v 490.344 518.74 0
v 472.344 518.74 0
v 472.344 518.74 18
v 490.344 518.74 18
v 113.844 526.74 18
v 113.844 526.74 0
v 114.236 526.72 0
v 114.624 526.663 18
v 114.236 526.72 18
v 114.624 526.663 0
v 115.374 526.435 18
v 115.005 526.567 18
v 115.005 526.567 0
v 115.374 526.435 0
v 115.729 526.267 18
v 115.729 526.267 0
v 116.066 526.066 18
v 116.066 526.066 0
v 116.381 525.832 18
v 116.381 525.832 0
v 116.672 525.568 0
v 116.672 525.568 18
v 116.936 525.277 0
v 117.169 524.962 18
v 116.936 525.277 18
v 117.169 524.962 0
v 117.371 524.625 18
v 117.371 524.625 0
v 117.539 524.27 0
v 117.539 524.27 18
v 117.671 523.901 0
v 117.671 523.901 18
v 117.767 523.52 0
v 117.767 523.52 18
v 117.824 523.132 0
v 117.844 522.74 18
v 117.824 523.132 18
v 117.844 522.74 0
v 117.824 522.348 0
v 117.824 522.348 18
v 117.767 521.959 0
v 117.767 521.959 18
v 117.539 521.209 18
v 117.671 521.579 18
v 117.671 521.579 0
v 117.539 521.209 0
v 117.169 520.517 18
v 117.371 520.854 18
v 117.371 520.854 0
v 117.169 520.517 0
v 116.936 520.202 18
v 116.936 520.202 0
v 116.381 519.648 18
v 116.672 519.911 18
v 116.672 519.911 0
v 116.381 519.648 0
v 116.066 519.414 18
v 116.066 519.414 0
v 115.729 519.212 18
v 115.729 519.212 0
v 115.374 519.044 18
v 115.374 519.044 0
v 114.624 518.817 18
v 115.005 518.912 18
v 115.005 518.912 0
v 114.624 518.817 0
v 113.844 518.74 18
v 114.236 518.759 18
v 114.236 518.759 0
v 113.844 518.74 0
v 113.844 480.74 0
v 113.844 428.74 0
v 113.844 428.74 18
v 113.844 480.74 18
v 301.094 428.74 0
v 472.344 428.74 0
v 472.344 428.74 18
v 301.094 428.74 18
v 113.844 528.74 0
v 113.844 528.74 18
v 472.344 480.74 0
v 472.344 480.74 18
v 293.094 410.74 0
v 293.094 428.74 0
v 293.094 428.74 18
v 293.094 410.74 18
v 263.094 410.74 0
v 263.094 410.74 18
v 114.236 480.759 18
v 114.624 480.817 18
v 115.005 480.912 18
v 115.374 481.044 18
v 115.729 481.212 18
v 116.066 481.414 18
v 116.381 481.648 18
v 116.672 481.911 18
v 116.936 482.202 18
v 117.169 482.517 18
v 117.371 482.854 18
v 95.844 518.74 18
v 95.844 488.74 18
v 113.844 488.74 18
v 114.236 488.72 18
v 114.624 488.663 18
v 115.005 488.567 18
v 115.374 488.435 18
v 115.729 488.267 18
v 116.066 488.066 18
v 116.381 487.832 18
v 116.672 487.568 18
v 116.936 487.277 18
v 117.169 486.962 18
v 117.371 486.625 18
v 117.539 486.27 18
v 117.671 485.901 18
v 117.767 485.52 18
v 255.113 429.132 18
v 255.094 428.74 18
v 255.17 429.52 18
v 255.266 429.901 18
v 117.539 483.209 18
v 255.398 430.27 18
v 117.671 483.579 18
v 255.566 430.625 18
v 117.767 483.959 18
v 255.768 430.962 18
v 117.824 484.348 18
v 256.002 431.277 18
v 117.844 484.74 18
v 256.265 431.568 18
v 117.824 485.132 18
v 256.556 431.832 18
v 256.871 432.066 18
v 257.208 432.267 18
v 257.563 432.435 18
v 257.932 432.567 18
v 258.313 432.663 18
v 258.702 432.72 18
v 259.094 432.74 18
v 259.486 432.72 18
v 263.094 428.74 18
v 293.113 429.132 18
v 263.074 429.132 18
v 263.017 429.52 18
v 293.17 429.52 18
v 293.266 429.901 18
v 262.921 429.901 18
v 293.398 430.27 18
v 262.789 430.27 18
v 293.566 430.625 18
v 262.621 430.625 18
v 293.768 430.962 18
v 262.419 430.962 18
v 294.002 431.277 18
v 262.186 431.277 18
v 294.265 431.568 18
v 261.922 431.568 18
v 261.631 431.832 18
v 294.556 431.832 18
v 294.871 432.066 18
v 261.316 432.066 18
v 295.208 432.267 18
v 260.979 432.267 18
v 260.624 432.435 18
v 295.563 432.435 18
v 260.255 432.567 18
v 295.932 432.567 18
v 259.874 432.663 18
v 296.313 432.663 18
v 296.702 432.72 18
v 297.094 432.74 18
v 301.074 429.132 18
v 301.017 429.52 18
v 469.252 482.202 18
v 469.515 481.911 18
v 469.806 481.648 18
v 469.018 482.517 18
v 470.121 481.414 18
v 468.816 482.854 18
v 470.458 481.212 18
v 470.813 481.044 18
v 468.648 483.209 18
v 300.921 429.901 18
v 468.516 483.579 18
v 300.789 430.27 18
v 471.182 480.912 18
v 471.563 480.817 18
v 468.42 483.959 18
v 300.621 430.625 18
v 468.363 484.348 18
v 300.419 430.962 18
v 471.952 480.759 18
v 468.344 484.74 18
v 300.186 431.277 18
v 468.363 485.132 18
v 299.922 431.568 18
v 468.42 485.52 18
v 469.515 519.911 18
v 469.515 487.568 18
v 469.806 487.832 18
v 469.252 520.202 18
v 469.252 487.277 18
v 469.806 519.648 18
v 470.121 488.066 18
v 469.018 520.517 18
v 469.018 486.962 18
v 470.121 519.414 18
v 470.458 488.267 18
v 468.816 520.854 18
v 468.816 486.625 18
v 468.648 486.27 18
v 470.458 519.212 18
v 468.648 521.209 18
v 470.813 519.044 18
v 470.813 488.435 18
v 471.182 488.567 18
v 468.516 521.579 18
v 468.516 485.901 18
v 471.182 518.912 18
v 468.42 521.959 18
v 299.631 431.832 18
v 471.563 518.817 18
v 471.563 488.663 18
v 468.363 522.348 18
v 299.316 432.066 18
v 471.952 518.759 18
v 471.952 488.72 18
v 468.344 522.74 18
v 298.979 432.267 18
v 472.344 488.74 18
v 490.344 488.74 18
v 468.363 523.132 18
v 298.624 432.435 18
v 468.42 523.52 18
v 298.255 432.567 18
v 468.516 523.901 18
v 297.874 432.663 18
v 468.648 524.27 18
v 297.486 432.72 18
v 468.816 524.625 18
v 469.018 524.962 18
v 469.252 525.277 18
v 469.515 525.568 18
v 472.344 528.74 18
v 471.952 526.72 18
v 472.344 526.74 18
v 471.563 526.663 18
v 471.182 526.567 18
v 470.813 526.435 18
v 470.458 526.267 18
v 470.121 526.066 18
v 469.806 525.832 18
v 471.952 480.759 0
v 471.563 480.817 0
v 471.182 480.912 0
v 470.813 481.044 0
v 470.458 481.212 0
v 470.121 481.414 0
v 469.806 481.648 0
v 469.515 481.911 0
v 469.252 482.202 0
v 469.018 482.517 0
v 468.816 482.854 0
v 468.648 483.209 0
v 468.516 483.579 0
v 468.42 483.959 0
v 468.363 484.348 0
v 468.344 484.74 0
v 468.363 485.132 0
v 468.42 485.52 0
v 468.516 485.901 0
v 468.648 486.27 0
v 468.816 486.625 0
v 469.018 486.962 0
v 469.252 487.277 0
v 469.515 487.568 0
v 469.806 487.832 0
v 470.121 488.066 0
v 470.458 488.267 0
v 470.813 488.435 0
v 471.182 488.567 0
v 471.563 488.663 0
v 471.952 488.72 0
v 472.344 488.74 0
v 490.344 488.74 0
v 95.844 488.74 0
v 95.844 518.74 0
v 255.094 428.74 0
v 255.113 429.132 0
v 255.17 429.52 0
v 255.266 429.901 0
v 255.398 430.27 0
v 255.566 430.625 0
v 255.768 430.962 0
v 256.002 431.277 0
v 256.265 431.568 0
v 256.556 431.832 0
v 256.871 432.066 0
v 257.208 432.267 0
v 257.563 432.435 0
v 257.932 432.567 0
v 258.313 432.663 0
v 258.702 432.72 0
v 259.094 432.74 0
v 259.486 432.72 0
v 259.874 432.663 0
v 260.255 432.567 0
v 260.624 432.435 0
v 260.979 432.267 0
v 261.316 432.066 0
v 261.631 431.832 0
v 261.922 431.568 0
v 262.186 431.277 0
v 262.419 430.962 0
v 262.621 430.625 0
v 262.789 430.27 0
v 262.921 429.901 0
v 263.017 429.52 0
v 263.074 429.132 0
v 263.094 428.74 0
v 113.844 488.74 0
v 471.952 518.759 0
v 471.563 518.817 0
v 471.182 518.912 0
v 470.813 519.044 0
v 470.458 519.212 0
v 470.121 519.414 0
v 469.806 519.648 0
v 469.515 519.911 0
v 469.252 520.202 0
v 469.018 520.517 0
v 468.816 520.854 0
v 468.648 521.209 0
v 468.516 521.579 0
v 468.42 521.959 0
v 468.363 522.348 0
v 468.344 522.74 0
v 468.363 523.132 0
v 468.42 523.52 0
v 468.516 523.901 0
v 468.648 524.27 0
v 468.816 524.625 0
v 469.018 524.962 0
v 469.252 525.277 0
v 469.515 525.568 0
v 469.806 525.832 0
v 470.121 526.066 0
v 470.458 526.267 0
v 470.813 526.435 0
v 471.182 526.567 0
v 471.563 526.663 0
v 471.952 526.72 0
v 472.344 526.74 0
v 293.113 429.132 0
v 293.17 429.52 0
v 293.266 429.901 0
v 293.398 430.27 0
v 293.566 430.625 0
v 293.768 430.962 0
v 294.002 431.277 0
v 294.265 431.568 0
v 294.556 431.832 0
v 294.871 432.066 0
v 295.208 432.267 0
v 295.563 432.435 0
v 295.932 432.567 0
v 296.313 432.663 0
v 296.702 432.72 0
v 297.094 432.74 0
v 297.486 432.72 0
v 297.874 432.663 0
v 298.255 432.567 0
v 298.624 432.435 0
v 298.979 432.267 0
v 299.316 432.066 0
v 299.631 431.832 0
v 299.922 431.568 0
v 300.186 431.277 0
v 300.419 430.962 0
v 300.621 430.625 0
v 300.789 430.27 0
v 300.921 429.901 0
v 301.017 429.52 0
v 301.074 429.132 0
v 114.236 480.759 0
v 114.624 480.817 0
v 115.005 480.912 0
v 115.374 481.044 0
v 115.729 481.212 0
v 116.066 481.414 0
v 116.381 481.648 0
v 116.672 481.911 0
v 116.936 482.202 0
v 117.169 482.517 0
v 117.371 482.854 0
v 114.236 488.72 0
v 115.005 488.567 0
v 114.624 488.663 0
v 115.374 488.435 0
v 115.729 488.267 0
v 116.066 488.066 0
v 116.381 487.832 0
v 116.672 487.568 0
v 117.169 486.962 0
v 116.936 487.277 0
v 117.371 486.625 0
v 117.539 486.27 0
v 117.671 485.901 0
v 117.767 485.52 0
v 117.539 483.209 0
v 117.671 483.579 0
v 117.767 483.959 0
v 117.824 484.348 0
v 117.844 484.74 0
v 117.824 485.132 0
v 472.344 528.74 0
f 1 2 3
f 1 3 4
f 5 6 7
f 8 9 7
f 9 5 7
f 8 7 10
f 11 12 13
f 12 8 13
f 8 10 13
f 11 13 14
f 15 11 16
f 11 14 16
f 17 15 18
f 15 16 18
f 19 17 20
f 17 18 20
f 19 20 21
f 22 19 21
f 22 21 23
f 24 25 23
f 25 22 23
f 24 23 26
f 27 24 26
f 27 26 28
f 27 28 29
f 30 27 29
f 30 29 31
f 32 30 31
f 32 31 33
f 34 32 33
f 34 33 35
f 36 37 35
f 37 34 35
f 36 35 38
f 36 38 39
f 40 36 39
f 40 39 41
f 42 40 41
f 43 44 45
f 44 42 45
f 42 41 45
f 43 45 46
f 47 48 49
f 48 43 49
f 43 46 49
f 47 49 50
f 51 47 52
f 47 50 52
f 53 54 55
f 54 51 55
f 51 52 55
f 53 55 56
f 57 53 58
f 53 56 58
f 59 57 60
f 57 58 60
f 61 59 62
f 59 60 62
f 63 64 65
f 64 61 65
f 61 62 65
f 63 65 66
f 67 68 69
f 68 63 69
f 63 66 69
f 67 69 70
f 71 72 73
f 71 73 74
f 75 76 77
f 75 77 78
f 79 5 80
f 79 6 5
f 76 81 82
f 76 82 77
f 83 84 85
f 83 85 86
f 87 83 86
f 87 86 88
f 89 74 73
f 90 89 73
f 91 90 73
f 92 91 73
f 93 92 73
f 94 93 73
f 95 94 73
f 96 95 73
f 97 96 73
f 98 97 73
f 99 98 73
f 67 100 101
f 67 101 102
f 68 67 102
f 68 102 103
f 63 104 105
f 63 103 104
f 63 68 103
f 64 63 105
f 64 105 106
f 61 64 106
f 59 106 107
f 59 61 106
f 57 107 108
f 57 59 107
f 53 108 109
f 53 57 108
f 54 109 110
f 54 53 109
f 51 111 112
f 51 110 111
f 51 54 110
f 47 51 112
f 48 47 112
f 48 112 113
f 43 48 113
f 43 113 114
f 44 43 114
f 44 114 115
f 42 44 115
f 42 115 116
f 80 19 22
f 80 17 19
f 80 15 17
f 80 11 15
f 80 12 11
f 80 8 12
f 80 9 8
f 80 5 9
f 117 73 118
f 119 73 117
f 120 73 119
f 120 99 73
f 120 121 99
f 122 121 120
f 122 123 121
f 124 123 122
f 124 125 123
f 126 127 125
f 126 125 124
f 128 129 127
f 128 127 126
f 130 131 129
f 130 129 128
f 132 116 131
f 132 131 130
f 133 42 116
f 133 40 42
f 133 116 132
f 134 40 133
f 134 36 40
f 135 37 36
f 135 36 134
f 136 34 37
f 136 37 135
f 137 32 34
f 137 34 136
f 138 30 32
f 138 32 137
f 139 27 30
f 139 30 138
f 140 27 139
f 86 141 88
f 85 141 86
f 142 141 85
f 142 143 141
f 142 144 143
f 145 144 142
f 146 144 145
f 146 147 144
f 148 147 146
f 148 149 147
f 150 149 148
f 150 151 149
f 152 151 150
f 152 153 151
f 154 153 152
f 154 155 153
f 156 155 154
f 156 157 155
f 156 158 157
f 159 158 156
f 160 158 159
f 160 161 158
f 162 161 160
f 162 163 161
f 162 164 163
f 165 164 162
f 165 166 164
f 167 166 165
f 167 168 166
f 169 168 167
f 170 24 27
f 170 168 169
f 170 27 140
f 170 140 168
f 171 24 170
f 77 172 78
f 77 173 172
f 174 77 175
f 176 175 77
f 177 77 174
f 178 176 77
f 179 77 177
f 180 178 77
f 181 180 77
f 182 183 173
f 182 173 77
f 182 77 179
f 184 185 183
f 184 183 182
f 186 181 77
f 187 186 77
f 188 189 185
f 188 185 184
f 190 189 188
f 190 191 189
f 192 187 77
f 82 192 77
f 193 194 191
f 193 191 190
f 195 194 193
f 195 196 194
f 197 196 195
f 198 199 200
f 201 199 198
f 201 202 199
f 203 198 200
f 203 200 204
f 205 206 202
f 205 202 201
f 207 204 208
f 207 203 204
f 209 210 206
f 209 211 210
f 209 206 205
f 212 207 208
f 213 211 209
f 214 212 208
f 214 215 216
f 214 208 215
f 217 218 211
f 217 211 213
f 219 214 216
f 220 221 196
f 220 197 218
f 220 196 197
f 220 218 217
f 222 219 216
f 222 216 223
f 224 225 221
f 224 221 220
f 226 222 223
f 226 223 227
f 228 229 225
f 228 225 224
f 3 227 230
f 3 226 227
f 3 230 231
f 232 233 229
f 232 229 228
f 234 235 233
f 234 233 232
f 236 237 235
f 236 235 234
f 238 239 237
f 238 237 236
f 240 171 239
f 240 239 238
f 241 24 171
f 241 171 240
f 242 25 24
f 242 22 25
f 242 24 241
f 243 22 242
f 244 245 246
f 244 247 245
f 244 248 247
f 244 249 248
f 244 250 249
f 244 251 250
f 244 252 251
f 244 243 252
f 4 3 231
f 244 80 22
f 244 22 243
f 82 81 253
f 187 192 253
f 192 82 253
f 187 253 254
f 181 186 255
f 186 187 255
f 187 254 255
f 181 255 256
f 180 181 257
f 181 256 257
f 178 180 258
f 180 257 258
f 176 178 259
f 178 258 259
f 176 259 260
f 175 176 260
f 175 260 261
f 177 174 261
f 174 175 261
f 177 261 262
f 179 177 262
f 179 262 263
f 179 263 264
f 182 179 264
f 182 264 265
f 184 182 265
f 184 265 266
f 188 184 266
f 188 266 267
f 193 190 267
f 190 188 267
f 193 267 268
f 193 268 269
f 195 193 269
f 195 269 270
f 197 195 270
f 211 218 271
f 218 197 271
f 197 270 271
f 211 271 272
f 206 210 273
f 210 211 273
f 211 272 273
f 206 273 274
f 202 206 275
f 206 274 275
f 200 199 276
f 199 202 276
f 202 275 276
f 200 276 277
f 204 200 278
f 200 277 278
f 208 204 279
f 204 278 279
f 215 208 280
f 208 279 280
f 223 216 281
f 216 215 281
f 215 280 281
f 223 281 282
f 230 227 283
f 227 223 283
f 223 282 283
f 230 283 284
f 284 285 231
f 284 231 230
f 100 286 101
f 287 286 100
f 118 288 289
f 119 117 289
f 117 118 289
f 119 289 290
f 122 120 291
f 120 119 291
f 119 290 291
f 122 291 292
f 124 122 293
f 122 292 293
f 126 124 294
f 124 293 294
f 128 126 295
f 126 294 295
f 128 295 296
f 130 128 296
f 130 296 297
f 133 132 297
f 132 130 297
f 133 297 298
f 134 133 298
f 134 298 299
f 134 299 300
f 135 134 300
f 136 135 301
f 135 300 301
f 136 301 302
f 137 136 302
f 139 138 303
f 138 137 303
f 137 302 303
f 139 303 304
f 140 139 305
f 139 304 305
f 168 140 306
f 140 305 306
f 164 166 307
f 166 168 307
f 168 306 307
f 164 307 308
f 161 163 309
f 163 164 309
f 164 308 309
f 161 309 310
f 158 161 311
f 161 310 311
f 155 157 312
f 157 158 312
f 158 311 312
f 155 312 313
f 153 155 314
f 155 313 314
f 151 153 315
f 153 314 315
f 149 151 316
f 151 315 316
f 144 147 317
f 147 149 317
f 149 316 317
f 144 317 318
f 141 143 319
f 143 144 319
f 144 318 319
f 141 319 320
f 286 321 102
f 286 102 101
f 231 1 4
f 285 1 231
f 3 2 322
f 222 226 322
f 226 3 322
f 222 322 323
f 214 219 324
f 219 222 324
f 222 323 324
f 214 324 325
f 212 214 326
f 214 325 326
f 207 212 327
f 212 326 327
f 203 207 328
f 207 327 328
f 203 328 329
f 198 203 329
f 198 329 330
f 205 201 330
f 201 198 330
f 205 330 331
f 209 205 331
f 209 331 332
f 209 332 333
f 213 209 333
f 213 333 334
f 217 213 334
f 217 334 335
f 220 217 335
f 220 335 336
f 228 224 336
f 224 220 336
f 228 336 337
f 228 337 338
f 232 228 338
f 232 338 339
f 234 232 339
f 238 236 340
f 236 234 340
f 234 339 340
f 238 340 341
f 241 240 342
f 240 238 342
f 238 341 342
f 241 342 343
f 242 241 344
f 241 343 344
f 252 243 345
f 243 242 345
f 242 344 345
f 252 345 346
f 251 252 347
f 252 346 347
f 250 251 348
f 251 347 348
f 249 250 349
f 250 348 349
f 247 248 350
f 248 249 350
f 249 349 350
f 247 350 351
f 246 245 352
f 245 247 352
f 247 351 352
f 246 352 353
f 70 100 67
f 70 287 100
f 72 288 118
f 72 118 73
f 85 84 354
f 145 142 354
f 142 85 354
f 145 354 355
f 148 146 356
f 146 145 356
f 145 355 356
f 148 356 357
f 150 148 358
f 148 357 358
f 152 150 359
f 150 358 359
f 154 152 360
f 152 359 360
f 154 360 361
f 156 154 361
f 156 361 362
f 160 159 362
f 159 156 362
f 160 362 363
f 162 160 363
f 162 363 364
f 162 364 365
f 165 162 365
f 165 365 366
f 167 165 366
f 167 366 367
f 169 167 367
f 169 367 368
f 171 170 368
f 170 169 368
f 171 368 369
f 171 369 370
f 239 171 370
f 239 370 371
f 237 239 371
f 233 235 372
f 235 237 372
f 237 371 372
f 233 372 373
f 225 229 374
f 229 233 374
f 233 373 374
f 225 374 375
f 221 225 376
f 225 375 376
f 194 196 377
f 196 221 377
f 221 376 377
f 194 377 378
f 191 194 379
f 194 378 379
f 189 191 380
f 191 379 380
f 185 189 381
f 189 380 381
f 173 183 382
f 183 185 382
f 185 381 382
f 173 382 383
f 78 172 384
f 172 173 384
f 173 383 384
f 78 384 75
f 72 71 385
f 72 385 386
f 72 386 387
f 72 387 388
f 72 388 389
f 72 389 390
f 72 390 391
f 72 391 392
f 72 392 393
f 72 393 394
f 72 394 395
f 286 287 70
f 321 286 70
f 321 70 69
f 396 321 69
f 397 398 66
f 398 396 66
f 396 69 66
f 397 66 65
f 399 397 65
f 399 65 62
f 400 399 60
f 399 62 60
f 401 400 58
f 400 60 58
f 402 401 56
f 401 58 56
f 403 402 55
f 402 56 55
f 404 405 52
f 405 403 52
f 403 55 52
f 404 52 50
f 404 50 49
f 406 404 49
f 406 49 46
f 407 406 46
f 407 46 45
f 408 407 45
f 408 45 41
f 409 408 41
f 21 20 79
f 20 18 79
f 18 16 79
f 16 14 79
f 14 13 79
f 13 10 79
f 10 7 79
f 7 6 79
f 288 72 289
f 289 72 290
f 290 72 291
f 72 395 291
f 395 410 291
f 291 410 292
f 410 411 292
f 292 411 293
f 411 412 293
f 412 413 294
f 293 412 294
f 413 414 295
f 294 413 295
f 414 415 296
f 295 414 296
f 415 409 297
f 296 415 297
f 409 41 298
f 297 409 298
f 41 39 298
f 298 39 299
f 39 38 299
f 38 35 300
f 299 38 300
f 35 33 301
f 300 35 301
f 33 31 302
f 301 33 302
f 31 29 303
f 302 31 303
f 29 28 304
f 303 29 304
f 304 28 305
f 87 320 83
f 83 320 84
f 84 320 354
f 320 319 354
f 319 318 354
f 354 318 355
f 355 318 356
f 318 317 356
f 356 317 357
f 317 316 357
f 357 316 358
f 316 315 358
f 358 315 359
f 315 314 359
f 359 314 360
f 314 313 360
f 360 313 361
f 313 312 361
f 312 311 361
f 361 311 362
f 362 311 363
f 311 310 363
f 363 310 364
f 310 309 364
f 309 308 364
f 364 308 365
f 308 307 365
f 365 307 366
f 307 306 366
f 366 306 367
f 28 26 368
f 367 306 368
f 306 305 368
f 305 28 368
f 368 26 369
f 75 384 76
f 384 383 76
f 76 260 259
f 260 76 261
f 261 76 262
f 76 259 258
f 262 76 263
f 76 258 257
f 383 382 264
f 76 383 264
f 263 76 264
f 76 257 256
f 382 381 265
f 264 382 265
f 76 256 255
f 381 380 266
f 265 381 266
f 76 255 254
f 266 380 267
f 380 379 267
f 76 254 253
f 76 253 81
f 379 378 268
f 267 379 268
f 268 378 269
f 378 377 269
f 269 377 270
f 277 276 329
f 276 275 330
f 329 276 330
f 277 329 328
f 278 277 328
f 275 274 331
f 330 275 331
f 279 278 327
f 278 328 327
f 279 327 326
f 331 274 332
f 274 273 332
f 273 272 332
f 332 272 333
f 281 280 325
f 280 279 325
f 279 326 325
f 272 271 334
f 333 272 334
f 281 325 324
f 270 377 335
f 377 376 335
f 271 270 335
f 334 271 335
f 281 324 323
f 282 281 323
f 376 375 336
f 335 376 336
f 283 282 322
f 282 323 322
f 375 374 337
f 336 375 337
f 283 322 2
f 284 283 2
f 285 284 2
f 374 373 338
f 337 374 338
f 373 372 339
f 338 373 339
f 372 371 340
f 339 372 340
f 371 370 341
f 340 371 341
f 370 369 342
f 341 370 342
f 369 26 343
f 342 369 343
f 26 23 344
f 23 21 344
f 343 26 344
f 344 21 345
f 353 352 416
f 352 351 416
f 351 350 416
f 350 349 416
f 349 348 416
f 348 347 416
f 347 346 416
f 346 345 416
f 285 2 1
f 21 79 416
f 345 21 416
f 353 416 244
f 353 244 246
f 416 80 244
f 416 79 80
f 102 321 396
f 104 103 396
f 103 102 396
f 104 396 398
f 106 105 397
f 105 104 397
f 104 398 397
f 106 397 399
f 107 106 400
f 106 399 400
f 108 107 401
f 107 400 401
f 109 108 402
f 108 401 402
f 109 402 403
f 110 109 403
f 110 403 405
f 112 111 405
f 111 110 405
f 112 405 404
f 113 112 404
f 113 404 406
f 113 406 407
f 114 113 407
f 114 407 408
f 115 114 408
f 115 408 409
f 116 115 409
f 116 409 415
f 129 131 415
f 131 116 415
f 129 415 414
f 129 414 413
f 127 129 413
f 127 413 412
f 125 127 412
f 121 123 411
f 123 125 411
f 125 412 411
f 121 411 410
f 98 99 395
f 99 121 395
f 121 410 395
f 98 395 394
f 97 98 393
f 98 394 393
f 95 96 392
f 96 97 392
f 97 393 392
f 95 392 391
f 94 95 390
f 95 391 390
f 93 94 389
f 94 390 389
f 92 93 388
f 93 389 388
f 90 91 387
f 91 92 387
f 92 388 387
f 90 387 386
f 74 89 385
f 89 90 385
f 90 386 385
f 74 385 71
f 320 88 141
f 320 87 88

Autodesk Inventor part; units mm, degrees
ref_plane "YZ Plane" through (0, 0, 0) normal (1, 0, 0) x (0, 1, 0)
ref_plane "XZ Plane" through (0, 0, 0) normal (0, 1, 0) x (-1, 0, 0)
ref_plane "XY Plane" through (0, 0, 0) normal (0, 0, 1) x (1, 0, 0)
sketch "CONTOURS" plane through (0, 0, 0) normal (0, 0, 1) x (1, 0, 0)
  arc A0 (113.8436, 518.7397) -> (113.8436, 526.7397) centre (113.8436, 522.7397) ccw
  line L0 (113.8436, 526.7397) -> (113.8436, 528.7397)
  line L1 (113.8436, 528.7397) -> (472.3436, 528.7397)
  line L2 (472.3436, 528.7397) -> (472.3436, 526.7397)
  arc A1 (472.3436, 526.7397) -> (472.3436, 518.7397) centre (472.3436, 522.7397) ccw
  line L3 (472.3436, 518.7397) -> (490.3436, 518.7397)
  line L4 (490.3436, 518.7397) -> (490.3436, 488.7397)
  line L5 (490.3436, 488.7397) -> (472.3436, 488.7397)
  arc A2 (472.3436, 488.7397) -> (472.3436, 480.7397) centre (472.3436, 484.7397) ccw
  line L6 (472.3436, 480.7397) -> (472.3436, 428.7397)
  line L7 (472.3436, 428.7397) -> (301.0936, 428.7397)
  arc A3 (301.0936, 428.7397) -> (293.0936, 428.7397) centre (297.0936, 428.7397) ccw
  line L8 (293.0936, 428.7397) -> (293.0936, 410.7397)
  line L9 (293.0936, 410.7397) -> (263.0936, 410.7397)
  line L10 (263.0936, 410.7397) -> (263.0936, 428.7397)
  arc A4 (263.0936, 428.7397) -> (255.0936, 428.7397) centre (259.0936, 428.7397) ccw
  line L11 (255.0936, 428.7397) -> (113.8436, 428.7397)
  line L12 (113.8436, 428.7397) -> (113.8436, 480.7397)
  arc A5 (113.8436, 480.7397) -> (113.8436, 488.7397) centre (113.8436, 484.7397) ccw
  line L13 (113.8436, 488.7397) -> (95.8436, 488.7397)
  line L14 (95.8436, 488.7397) -> (95.8436, 518.7397)
  line L15 (95.8436, 518.7397) -> (113.8436, 518.7397)
extrude "Extrusion1" add sketch "CONTOURS" along normal blind 18
properties part number "Layer 1 Plank" material "Wood (Birch)"
